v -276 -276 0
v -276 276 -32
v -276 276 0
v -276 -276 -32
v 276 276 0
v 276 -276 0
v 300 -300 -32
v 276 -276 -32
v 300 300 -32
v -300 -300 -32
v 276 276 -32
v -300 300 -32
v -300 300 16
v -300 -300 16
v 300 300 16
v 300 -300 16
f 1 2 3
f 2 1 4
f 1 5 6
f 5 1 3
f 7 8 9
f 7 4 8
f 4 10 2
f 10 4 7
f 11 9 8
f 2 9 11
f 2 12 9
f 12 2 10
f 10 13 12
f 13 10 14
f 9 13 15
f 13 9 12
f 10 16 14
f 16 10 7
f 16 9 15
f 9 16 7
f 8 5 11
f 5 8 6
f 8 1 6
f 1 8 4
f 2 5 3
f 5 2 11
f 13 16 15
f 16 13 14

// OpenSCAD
// 24" T-bar acoustic drop-ceiling tile + grid frame.
// One tile = 0.6 m × 0.6 m × 0.016 m. Local origin = tile center.
// V2 Phase 4.1.
//
// Structural finish — no pipe connection, so no @port.

// @part drop_ceiling_tile
// @kind structural
// @category arch.ceiling.tile
// @display-name "Drop Ceiling Tile 24\" × 24\""
// @mfg armstrong
// @mfg-pn 704A
// @price-usd 4.25
// @install-minutes 5
// @crew apprentice
// @param tile_w_mm number[300,1200] default=600 label="Tile Width" unit="mm"

tile_w_mm = 600;
tile_d_mm = 600;
tile_thick_mm = 16;
tbar_w_mm = 24;     // T-bar grid metal width
tbar_h_mm = 32;     // T-bar grid drop below tile face

// Tile body
translate([0, 0, tile_thick_mm / 2])
    cube(size = [tile_w_mm, tile_d_mm, tile_thick_mm], center = true);

// T-bar grid (4 sides — typical inverted-T profile)
for (axis = [0, 1]) {
    for (sign = [-1, 1]) {
        translate(axis == 0
            ? [sign * (tile_w_mm / 2 - tbar_w_mm / 2), 0, -tbar_h_mm / 2]
            : [0, sign * (tile_d_mm / 2 - tbar_w_mm / 2), -tbar_h_mm / 2])
            cube(
                size = axis == 0
                    ? [tbar_w_mm, tile_d_mm, tbar_h_mm]
                    : [tile_w_mm, tbar_w_mm, tbar_h_mm],
                center = true
            );
    }
}
